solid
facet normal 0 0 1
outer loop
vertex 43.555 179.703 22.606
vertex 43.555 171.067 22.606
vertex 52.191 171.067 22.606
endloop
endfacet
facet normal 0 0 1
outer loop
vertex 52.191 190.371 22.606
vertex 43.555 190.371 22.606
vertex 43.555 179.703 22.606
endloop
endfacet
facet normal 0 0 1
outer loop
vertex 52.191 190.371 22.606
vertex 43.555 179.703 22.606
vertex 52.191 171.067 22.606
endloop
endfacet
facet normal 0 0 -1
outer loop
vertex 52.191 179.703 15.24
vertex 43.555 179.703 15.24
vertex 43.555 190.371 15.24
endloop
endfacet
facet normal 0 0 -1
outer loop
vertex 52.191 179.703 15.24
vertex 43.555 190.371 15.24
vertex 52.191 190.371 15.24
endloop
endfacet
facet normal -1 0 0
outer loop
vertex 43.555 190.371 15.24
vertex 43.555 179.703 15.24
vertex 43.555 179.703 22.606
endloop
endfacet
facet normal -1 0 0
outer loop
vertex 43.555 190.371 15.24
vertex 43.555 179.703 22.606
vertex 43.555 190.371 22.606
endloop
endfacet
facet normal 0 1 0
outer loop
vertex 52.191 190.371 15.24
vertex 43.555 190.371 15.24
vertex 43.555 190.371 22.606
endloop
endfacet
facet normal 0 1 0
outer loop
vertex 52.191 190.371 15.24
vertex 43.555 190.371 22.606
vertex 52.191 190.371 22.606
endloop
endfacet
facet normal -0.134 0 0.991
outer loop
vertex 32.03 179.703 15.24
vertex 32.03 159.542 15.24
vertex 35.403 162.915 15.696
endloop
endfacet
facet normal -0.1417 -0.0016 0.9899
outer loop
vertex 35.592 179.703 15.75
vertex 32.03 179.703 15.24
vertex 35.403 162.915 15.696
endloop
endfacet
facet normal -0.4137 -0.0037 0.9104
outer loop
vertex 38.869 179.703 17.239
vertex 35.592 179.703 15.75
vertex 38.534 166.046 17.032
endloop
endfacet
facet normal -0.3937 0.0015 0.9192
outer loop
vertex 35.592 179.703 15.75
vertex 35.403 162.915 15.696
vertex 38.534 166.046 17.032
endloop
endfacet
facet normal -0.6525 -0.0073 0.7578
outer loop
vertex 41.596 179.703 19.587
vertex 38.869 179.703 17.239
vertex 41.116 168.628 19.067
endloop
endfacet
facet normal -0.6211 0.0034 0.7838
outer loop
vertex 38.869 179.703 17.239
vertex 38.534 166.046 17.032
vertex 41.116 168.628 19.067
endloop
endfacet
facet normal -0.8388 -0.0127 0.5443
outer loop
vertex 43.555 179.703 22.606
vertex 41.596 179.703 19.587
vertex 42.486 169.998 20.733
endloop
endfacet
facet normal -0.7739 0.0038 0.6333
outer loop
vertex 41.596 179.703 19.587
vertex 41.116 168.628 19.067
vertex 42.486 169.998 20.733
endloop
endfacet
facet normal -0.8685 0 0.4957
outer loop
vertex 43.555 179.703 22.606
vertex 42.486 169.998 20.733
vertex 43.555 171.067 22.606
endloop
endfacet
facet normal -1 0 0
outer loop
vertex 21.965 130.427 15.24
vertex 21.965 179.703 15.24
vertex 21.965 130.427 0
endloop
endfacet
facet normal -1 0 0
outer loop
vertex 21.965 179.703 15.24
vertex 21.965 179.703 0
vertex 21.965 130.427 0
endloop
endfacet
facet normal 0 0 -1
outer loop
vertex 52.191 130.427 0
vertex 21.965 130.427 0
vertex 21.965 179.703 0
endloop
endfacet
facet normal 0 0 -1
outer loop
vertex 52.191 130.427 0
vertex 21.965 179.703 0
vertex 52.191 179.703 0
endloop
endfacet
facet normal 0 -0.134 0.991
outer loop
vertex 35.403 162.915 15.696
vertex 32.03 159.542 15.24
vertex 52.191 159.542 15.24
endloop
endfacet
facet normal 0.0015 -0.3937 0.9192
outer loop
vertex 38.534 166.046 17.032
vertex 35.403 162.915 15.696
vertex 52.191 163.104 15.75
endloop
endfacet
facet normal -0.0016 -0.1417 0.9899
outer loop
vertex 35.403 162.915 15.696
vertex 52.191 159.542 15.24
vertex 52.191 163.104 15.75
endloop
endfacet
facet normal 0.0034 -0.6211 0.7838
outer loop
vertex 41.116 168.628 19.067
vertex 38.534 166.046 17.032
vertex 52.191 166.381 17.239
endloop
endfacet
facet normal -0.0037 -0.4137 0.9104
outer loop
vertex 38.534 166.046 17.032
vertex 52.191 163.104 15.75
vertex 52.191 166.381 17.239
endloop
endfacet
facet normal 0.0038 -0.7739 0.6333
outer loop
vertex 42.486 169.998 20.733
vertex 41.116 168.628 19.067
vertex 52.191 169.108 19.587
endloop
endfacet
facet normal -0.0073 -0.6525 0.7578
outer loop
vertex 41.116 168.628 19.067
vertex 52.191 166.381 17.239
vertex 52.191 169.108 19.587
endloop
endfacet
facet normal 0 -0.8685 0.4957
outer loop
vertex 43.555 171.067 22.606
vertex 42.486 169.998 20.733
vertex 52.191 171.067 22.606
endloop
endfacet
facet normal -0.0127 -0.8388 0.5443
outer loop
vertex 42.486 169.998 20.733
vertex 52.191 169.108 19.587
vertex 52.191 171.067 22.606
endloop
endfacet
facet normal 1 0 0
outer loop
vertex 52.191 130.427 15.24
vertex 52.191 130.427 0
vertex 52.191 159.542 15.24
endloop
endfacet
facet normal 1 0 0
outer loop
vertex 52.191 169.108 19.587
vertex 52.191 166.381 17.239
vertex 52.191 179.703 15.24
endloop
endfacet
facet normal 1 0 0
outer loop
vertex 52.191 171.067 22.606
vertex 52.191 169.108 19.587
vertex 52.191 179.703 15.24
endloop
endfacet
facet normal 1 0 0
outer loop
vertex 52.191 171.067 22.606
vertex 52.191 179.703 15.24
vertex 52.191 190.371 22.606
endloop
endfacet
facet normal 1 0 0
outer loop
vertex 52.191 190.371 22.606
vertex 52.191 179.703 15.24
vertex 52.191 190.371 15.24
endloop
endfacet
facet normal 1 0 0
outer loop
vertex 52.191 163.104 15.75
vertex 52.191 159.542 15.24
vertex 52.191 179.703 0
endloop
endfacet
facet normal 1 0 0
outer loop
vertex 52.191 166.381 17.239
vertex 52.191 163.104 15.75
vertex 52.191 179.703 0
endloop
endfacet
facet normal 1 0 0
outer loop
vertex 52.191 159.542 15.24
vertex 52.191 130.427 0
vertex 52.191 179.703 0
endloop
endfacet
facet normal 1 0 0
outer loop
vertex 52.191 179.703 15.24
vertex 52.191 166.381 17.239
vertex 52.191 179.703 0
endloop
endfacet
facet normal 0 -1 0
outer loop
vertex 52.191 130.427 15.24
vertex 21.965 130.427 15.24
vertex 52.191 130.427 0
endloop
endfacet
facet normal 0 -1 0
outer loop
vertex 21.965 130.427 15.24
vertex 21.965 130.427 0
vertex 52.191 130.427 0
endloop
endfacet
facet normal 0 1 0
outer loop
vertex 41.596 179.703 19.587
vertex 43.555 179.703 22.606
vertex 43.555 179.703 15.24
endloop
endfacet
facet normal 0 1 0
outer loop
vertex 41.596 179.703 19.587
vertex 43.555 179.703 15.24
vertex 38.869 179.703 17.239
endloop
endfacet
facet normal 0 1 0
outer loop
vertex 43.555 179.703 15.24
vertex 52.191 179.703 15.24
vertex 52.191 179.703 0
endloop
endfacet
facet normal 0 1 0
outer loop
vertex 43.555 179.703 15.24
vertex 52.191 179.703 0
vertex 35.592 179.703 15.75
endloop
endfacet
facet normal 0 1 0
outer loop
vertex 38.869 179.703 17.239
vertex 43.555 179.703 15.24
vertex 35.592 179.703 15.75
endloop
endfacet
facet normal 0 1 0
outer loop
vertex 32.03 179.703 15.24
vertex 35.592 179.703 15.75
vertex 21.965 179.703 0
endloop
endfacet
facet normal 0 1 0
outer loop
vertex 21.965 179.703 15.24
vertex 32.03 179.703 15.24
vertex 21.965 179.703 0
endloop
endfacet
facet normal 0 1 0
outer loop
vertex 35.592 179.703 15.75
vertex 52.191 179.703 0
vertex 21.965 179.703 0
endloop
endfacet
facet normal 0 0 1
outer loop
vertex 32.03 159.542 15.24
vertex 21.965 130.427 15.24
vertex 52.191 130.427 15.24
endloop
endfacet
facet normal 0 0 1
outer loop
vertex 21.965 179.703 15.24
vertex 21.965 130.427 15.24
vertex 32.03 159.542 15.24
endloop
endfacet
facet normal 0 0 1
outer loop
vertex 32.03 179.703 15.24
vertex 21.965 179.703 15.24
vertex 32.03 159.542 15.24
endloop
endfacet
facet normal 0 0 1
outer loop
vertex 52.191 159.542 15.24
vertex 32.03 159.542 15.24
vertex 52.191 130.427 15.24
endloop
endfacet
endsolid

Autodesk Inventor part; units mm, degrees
ref_plane "YZ Plane" through (0, 0, 0) normal (1, 0, 0) x (0, 1, 0)
ref_plane "XZ Plane" through (0, 0, 0) normal (0, 1, 0) x (-1, 0, 0)
ref_plane "XY Plane" through (0, 0, 0) normal (0, 0, 1) x (1, 0, 0)
sketch "Sketch1" plane through (0, 0, 0) normal (0, 0, 1) x (1, 0, 0)
  line L0 (52.1911, 179.7031) -> (21.9651, 179.7031)
  line L1 (21.9651, 179.7031) -> (21.9651, 130.4271)
  line L2 (21.9651, 130.4271) -> (52.1911, 130.4271)
  line L3 (52.1911, 130.4271) -> (52.1911, 179.7031)
  point P0 (0, 0)
  dimension "d0" = 30.226
  dimension "d1" = 49.276
extrude "Extrusion1" add sketch "Sketch1" along normal blind 15.24
sketch "Sketch2" plane through (0, 0, 15.24) normal (0, 0, 1) x (1, 0, 0)
  line L0 (52.1911, 179.7031) -> (52.1911, 130.4271) projected
  line L1 (21.9651, 179.7031) -> (52.1911, 179.7031) projected
  line L2 (52.1911, 171.0671) -> (43.5551, 171.0671)
  line L3 (43.5551, 171.0671) -> (43.5551, 190.3711)
  line L4 (43.5551, 190.3711) -> (52.1911, 190.3711)
  line L5 (52.1911, 190.3711) -> (52.1911, 171.0671)
  point P0 (0, 0)
  dimension "d4" = 8.636
  dimension "d5" = 8.636
  dimension "d6" = 10.668
extrude "Extrusion2" add sketch "Sketch2" along normal blind 7.366
fillet "Fillet1" radius 12.7 2 edges at (43.5551, 175.3851, 15.24) (47.8731, 171.0671, 15.24)
properties part number "Rangelink Reciever"
